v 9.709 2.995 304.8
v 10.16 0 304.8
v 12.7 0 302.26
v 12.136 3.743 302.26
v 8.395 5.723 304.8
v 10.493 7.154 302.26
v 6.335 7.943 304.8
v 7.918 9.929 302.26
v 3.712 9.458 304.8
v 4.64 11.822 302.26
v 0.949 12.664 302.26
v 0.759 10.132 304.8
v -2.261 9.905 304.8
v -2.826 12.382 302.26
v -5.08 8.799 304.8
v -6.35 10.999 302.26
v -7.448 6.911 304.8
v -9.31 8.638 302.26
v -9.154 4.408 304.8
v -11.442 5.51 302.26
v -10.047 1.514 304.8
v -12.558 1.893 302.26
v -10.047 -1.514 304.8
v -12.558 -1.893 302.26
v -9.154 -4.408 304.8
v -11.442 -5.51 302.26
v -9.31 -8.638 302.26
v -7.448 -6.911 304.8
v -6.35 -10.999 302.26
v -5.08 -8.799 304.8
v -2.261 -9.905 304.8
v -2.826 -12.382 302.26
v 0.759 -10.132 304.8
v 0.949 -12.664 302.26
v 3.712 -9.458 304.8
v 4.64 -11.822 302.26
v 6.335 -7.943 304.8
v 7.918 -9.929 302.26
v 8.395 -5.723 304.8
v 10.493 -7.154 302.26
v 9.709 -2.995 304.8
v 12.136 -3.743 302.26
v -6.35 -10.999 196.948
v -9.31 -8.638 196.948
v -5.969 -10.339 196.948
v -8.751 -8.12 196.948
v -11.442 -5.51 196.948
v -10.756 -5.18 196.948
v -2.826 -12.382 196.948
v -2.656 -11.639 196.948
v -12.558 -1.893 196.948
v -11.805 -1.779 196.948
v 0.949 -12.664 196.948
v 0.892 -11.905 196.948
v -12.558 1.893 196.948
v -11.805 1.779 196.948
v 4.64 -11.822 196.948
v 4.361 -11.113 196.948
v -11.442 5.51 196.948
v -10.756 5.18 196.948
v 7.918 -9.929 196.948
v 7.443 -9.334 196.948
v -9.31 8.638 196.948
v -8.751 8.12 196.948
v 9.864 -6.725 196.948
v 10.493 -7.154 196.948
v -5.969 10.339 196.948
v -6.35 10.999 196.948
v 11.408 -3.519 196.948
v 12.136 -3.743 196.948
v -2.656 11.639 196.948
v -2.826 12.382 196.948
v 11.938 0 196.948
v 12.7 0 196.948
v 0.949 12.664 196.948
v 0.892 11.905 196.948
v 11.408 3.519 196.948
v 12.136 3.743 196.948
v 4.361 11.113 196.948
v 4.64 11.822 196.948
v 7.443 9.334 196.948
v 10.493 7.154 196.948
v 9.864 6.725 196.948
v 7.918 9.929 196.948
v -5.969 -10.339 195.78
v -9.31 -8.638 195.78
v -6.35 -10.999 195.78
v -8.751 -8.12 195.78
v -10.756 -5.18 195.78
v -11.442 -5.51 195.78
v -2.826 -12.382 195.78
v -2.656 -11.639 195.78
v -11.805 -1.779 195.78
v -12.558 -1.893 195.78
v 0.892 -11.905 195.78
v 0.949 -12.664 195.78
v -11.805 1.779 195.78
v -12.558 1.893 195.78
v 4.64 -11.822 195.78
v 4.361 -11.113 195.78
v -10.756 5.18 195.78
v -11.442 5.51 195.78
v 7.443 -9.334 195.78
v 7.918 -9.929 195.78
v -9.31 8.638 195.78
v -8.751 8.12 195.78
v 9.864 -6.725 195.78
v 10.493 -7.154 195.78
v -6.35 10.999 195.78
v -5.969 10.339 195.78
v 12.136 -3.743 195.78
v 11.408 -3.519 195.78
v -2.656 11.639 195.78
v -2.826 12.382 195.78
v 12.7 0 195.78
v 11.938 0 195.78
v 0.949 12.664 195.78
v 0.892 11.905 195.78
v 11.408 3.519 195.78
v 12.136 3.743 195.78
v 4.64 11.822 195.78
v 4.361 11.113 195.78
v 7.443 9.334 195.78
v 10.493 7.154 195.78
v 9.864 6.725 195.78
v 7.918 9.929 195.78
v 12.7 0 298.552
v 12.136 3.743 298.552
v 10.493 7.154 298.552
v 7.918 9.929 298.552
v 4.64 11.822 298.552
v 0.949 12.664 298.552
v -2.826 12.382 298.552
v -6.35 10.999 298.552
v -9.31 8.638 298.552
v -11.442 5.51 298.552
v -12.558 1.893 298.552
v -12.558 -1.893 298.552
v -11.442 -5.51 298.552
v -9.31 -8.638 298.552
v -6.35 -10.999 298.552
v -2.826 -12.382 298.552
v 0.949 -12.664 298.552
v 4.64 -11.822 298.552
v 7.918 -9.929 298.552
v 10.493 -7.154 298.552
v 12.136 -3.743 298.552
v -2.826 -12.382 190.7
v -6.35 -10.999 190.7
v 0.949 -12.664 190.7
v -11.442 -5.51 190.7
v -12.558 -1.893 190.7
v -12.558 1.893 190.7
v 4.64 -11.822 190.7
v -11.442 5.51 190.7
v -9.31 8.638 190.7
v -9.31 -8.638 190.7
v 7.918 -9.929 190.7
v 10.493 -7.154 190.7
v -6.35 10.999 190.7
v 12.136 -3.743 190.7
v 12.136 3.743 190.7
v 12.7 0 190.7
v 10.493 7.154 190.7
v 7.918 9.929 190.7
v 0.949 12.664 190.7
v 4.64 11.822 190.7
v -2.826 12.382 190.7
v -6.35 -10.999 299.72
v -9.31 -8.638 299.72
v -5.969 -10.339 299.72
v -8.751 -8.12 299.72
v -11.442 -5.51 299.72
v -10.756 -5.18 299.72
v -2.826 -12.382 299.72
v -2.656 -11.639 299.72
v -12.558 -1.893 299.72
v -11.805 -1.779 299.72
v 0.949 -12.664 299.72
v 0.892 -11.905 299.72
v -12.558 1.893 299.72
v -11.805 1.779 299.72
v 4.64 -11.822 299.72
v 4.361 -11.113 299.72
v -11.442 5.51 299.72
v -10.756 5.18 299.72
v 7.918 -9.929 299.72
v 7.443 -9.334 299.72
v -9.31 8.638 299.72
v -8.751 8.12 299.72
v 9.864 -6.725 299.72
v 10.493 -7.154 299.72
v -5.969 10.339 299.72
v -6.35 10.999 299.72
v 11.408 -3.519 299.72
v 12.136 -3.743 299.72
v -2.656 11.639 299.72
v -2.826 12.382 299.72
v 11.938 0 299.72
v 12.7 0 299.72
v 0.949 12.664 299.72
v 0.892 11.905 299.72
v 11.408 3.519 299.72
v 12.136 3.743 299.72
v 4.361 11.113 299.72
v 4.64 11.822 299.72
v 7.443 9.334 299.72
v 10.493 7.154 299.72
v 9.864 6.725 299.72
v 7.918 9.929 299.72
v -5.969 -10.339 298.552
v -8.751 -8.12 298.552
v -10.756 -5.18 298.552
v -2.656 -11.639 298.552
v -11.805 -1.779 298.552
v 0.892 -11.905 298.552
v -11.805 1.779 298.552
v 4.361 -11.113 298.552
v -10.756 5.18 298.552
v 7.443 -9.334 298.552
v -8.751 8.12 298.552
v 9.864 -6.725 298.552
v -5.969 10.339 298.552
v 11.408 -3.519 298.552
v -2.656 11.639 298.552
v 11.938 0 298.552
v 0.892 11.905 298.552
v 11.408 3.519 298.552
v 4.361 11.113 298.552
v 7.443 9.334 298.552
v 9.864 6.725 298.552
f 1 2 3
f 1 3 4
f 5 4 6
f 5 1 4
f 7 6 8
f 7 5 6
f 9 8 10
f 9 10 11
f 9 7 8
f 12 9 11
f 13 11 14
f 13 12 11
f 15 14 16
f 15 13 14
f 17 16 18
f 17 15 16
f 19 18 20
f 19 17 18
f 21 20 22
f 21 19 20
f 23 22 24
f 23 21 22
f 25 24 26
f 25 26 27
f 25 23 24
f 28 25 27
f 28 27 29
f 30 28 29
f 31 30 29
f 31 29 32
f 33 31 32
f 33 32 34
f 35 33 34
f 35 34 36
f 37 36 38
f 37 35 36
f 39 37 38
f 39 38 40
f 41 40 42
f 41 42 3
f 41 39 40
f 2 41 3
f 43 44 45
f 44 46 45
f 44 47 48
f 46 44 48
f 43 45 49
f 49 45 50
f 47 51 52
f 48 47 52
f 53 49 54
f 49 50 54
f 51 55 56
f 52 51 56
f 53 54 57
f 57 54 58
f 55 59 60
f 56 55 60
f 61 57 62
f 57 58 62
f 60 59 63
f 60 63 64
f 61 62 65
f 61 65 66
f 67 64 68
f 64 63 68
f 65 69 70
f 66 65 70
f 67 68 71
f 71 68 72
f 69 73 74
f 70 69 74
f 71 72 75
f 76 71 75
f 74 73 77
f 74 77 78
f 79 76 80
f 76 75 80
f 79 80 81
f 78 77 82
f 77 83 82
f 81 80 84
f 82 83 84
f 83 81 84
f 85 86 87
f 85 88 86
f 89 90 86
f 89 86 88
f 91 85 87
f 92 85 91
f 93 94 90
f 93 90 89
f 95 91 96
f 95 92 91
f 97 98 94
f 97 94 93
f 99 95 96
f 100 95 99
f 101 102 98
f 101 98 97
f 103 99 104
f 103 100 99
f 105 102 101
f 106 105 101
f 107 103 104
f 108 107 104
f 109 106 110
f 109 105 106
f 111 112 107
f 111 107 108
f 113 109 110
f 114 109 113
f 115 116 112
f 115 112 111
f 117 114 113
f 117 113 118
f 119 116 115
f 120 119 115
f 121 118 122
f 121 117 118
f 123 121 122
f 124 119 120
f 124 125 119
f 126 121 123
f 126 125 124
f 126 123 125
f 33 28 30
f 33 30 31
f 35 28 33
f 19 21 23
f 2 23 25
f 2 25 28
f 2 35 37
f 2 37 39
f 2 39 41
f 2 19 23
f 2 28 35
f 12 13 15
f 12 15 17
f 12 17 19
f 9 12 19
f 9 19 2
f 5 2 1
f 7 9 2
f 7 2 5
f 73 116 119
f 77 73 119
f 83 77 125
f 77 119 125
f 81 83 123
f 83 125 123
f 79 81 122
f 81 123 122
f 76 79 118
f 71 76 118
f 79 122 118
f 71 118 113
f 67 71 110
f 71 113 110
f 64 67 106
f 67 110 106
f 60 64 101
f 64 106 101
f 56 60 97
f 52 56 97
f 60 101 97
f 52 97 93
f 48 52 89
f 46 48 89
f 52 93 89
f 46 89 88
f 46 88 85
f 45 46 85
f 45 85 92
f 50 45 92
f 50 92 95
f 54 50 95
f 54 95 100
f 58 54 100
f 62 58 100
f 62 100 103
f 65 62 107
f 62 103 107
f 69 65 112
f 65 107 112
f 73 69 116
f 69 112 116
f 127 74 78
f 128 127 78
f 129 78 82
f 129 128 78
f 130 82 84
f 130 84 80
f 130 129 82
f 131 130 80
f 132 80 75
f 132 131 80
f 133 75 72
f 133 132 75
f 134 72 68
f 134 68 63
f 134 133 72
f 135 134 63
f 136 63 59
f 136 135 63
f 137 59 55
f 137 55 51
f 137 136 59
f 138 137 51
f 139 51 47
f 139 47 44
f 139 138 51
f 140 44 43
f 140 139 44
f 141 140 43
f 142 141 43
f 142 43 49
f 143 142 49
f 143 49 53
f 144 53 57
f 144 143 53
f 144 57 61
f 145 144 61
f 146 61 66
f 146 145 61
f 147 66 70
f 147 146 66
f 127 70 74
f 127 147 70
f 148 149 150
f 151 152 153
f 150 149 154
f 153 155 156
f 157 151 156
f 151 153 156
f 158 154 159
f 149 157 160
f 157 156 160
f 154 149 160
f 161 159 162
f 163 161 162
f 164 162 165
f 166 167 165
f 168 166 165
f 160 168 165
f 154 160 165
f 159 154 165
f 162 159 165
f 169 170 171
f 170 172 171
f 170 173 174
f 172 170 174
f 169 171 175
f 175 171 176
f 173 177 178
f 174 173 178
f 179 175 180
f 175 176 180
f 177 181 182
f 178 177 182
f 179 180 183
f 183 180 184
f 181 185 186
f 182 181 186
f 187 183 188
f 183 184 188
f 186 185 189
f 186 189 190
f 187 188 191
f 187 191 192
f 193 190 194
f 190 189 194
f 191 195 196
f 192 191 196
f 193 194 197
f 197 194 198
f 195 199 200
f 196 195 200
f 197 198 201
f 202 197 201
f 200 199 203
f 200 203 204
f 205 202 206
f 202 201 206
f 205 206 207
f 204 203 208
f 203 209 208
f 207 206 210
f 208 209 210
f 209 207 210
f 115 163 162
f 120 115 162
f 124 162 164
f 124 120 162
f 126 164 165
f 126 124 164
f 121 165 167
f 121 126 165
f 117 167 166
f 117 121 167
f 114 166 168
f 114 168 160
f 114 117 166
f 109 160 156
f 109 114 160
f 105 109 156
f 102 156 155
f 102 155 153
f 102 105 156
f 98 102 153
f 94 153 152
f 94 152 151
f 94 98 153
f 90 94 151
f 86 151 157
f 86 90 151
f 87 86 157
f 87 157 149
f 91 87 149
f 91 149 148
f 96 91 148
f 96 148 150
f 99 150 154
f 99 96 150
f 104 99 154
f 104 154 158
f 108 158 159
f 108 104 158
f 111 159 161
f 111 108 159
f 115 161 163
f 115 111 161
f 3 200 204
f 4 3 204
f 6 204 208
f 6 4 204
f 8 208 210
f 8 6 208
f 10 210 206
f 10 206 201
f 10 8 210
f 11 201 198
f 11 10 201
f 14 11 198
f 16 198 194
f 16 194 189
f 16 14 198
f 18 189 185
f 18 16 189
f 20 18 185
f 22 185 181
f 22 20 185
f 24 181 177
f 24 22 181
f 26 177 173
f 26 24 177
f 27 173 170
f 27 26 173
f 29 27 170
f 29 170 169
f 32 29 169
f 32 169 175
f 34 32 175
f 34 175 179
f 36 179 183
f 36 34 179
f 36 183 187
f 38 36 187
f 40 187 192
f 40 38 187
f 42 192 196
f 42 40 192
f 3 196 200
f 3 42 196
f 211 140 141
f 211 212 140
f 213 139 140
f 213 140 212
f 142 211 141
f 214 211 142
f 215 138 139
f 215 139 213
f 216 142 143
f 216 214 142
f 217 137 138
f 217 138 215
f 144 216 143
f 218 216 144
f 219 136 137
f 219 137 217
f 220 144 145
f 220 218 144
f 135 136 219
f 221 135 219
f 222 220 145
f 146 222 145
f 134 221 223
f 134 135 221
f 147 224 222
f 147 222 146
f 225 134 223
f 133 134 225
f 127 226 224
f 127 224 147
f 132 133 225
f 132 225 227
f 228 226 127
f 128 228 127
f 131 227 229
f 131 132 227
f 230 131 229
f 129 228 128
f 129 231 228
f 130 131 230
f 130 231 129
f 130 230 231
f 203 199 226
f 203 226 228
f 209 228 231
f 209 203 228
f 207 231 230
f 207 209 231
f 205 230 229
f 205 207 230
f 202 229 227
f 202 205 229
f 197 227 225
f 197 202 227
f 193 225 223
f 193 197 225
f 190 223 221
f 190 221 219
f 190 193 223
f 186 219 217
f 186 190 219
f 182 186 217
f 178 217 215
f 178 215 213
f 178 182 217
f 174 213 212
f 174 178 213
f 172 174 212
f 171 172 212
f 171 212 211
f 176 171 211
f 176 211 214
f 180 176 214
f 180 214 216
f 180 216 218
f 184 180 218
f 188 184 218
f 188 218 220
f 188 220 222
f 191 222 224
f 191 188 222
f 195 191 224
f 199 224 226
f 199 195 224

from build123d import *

# Parameters (mm, degrees)
SKETCH3_R           = 12.7
BOSS_EXTRUDE1_DEPTH = 304.8
CHAMFER1_SIZE       = 2.54
CUT_EXTRUDE1_START  = -114.1
SKETCH4_R           = 12.7
CUT_EXTRUDE1_DEPTH  = 496.5
CUT_EXTRUDE2_START  = -5.08
SKETCH5_R           = 12.7
SKETCH5_R_2         = 11.938
CUT_EXTRUDE2_DEPTH  = 1.1684


with BuildPart() as part:
    # Sketch3 → Boss-Extrude1 (new body, symmetric)
    with BuildSketch(Plane.XY):
        Circle(SKETCH3_R)
    extrude(amount=BOSS_EXTRUDE1_DEPTH, both=True)

    # Chamfer1
    chamfer1_edges = [part.edges().sort_by_distance(p)[0] for p in [
        (-12.7, 0, -304.8),
        (-12.7, 0, 304.8),
    ]]
    chamfer(chamfer1_edges, length=CHAMFER1_SIZE)

    # Sketch4 → Cut-Extrude1 (cut, through all)
    with BuildSketch(Plane.XY.offset(304.8).offset(CUT_EXTRUDE1_START)):
        Circle(SKETCH4_R)
    extrude(amount=-CUT_EXTRUDE1_DEPTH, mode=Mode.SUBTRACT)

    # Sketch5 → Cut-Extrude2 (cut)
    with BuildSketch(Plane.XY.offset(304.8).offset(CUT_EXTRUDE2_START)):
        Circle(SKETCH5_R)
        Circle(SKETCH5_R_2, mode=Mode.SUBTRACT)
    cut_extrude2 = extrude(amount=-CUT_EXTRUDE2_DEPTH, mode=Mode.SUBTRACT)

    # Mirror3: Cut-Extrude2 across plane
    add(cut_extrude2.mirror(Plane.XY.offset(247.75)), mode=Mode.SUBTRACT)


solid = part.part
